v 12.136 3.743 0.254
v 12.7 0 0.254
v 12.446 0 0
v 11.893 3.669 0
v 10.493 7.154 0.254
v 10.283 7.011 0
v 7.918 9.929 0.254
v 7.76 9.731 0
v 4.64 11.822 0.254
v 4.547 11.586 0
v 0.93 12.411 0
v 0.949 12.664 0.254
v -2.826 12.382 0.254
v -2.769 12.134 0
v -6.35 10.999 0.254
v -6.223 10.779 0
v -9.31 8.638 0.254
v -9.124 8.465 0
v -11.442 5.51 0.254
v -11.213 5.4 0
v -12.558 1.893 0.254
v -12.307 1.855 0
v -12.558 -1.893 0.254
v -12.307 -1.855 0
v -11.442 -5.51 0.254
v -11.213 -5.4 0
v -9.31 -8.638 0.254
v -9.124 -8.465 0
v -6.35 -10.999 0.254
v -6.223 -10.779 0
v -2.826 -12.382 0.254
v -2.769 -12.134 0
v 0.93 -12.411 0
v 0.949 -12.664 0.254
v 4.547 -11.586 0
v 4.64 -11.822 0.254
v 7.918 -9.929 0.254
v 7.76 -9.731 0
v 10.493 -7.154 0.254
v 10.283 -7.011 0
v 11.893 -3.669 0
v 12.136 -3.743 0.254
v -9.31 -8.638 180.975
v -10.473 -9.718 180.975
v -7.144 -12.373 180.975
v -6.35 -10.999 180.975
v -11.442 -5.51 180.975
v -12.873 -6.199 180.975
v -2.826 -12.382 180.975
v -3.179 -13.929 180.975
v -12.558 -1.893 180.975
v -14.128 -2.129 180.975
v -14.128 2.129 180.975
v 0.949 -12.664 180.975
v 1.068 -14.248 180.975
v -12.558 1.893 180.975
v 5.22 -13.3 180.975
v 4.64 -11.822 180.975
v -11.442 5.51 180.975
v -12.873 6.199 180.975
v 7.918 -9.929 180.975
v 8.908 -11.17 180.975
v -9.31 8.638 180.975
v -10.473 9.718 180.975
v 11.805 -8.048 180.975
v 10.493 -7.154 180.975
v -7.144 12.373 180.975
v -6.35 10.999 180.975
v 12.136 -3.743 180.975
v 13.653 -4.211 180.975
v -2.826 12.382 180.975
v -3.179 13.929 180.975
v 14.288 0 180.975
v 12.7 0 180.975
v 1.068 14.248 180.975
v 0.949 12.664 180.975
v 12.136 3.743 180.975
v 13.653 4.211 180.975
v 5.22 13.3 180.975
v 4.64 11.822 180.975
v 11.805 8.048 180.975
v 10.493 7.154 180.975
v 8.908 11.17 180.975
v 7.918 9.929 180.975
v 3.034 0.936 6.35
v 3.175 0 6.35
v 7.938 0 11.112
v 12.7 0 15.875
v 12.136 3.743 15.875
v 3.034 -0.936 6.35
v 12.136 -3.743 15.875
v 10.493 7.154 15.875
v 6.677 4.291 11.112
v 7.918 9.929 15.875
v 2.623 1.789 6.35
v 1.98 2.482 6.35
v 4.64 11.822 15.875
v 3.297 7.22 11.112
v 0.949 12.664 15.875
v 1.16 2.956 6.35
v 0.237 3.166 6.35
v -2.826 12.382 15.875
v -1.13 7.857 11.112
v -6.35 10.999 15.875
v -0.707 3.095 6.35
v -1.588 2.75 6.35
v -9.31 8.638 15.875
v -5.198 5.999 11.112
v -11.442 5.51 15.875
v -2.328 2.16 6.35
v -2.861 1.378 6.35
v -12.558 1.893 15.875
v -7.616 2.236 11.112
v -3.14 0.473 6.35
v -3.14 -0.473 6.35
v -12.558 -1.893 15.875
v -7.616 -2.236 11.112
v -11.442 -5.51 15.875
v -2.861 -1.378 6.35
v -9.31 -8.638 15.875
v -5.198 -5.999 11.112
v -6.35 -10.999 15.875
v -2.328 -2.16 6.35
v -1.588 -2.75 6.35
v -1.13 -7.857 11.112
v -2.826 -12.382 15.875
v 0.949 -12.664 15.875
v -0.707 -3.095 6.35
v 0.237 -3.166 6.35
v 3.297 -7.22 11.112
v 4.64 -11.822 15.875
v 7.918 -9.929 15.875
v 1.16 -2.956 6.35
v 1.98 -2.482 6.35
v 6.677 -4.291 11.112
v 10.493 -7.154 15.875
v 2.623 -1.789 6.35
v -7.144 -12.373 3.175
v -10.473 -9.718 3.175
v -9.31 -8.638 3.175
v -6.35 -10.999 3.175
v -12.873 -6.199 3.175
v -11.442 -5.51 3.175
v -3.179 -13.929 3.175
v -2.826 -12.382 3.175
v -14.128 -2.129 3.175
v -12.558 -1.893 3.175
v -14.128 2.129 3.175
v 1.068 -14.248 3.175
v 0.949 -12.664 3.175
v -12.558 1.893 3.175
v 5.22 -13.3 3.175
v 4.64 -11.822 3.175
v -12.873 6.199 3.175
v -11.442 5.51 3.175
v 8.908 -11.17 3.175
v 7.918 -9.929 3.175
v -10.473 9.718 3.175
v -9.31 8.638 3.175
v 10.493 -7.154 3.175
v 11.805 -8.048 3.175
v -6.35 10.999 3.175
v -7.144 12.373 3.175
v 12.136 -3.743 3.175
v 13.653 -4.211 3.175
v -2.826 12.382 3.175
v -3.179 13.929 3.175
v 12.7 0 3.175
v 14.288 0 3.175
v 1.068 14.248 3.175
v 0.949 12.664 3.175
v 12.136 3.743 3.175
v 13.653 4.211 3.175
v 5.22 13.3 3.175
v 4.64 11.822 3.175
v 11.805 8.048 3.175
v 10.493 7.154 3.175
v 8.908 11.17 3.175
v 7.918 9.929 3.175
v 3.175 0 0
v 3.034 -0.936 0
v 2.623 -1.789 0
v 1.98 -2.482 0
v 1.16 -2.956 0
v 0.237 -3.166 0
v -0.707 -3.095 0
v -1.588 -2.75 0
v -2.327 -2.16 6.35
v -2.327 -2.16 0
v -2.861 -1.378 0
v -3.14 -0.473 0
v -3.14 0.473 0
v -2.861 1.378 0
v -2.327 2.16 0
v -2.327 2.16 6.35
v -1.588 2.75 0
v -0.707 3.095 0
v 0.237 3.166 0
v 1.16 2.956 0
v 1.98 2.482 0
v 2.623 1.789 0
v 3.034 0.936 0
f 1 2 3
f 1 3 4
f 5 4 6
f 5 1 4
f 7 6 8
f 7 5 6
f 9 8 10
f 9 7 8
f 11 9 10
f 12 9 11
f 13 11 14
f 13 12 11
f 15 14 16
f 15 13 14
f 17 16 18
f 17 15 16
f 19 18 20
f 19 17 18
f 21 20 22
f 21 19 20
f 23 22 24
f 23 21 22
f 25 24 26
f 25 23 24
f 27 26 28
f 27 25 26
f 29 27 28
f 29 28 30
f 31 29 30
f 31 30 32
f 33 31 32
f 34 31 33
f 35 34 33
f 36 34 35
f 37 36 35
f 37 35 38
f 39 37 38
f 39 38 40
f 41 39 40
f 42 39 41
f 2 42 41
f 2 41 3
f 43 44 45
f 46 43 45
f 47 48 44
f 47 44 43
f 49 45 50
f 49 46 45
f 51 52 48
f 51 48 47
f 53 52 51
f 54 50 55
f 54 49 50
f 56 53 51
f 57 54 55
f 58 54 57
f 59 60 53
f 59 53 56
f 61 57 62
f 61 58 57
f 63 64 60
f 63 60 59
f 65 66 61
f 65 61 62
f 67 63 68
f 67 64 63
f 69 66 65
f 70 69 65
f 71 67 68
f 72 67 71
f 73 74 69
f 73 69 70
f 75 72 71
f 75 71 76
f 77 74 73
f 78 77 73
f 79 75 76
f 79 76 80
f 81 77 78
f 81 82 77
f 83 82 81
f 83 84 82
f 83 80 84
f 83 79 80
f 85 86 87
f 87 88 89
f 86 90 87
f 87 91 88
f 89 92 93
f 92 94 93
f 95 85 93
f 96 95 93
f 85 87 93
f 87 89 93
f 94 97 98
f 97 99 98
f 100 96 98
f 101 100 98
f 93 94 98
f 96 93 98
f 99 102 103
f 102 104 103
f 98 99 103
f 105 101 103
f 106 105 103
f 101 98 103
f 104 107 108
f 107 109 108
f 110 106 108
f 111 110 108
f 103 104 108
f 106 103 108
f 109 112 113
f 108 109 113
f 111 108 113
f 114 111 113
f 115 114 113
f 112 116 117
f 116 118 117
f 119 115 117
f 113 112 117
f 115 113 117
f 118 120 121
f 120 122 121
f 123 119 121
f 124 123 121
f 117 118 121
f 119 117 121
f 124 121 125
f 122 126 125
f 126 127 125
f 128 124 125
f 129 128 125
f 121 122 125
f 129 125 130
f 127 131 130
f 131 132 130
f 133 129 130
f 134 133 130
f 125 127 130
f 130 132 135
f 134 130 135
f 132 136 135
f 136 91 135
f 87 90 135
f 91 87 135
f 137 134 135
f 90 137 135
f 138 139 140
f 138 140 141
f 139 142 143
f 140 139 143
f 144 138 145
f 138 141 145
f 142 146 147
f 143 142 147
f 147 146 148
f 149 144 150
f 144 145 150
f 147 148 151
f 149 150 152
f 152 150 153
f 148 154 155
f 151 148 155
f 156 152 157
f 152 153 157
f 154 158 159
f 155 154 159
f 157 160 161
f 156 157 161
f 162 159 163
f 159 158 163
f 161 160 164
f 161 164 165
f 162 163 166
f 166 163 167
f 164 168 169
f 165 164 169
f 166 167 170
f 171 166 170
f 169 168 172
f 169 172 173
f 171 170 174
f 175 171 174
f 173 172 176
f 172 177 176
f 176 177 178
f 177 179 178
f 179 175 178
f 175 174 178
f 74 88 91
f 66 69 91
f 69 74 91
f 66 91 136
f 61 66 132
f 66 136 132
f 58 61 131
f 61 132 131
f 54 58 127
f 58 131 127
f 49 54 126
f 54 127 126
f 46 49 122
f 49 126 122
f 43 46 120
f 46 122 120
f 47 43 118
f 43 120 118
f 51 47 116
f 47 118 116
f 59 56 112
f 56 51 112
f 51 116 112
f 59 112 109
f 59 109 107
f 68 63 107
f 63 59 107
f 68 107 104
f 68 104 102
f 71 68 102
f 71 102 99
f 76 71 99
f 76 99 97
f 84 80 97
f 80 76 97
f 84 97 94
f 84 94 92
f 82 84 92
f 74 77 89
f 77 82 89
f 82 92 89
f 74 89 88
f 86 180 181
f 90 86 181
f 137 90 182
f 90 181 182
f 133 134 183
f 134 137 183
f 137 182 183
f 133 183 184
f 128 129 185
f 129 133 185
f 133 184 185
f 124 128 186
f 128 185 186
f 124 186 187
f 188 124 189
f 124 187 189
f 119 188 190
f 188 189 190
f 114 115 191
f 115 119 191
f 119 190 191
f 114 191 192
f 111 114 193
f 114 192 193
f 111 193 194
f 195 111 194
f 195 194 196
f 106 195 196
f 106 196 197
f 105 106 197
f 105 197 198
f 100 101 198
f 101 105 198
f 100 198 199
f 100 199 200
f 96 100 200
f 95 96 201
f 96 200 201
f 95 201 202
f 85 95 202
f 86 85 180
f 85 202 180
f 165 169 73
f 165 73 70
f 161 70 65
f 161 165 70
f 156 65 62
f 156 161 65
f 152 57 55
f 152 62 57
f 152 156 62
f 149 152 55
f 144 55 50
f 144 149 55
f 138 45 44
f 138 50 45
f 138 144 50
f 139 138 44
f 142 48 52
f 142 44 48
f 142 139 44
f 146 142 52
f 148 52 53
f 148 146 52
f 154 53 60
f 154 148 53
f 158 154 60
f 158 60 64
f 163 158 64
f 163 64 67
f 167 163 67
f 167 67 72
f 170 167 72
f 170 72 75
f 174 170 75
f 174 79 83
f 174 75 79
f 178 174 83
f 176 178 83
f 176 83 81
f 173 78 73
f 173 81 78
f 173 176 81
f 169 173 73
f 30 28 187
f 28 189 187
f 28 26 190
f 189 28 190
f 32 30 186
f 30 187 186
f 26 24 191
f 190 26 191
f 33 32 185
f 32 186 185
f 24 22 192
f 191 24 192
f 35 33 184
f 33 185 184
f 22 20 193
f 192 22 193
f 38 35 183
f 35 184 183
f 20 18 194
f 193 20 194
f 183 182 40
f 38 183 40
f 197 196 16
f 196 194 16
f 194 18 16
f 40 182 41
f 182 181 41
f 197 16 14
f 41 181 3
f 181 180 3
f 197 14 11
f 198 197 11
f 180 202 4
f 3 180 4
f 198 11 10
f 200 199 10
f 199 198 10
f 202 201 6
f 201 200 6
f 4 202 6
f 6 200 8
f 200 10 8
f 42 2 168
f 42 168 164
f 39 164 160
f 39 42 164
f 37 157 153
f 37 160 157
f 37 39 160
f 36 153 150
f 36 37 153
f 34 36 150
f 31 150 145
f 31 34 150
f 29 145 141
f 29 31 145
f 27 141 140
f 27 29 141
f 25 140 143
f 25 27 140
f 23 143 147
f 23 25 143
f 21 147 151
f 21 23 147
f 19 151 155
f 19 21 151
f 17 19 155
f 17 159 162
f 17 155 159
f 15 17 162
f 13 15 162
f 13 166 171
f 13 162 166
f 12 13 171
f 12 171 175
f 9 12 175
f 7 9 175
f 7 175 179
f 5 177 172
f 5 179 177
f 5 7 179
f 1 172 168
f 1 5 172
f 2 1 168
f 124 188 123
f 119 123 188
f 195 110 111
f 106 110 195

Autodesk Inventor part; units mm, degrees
ref_plane "YZ Plane" through (0, 0, 0) normal (1, 0, 0) x (0, 1, 0)
ref_plane "XZ Plane" through (0, 0, 0) normal (0, 1, 0) x (-1, 0, 0)
ref_plane "XY Plane" through (0, 0, 0) normal (0, 0, 1) x (1, 0, 0)
sketch "Sketch1" plane through (0, 0, 0) normal (0, 0, 1) x (1, 0, 0)
  circle A0 centre (0, 0) radius 12.7 projected
  circle A1 centre (0, 0) radius 3.175
  dimension "d0" = 6.35
extrude "Extrusion1" add sketch "Sketch1" along normal blind 3.175
sketch "Sketch2" plane through (0, 0, 3.175) normal (0, 0, 1) x (1, 0, 0)
  circle A0 centre (0, 0) radius 12.7 projected
  circle A1 centre (0, 0) radius 11.1125
  circle A2 centre (0, 0) radius 14.2875
  dimension "d3" = 22.225
  dimension "d4" = 28.575
extrude "Extrusion2" add sketch "Sketch2" along normal blind 177.8 contours A2
sketch "Sketch3" plane through (0, 0, 3.175) normal (0, 0, 1) x (1, 0, 0)
  circle A0 centre (0, 0) radius 12.7 projected
  circle A1 centre (0, 0) radius 3.175 projected
extrude "Extrusion3" add sketch "Sketch3" along normal blind 3.175
chamfer "Chamfer1" distance 9.525 angle 45 1 edges at (-12.7, 0, 6.35)
chamfer "Chamfer2" distance 0.254 angle 45 1 edges at (-12.7, 0, 0)
properties part number "pourTool"
